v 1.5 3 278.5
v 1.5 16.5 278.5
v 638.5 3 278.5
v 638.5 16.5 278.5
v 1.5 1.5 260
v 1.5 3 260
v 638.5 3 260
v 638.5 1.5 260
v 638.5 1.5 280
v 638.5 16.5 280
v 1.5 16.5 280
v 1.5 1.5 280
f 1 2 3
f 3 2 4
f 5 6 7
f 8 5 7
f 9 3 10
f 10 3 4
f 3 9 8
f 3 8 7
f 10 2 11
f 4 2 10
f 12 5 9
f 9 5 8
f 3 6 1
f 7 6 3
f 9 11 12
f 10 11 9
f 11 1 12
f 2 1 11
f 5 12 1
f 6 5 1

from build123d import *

# Parameters (mm, degrees)
BOX013_W      = 637
BOX013_H      = 15
BOX013_DEPTH  = 20
BOX012_W      = 637
BOX012_H      = 15
BOX012_DEPTH  = 20
SKETCH012_R   = 2.05
HOLE007_DEPTH = 1291.481784


with BuildPart() as cube008:
    # Box013 → Box013 (new body)
    with BuildSketch(Plane(origin=(1.5, 1.5, -1.5), x_dir=(1, 0, 0), z_dir=(0, 0, 1))):
        with Locations((318.5, 7.5)):
            Rectangle(BOX013_W, BOX013_H)
    extrude(amount=BOX013_DEPTH)


with BuildPart() as top_front_body:
    # Box012 → Box012 (new body)
    with BuildSketch(Plane(origin=(1.5, 0, 0), x_dir=(1, 0, 0), z_dir=(0, 0, 1))):
        with Locations((318.5, 7.5)):
            Rectangle(BOX012_W, BOX012_H)
    extrude(amount=BOX012_DEPTH)

    # Cut: cut Cube008
    add(cube008.part, mode=Mode.SUBTRACT)


with BuildPart() as top_front_body_1:
    # Cut placement: moved
    add(top_front_body.part.moved(Location((0, 1.5, 250))))


with BuildPart() as top_front_body_2:
    # BaseFeature005 placement: moved
    add(top_front_body_1.part.moved(Location((0, -1.5, -250))))

    # Sketch012 → Hole007 (cut, through all)
    with BuildSketch(Plane.XZ.offset(1.5)):
        with Locations((-7.75, 9.25)):
            Circle(SKETCH012_R)
    hole007 = extrude(amount=-HOLE007_DEPTH, mode=Mode.SUBTRACT)

    # Mirrored004: Hole007 across Sketch012 Axis0
    add(hole007.mirror(Plane(origin=(320, -1.5, 19.25), x_dir=(0, -1, 0), z_dir=(1, 0, 0))), mode=Mode.SUBTRACT)


with BuildPart() as top_front_body_3:
    # Body005 placement: moved
    add(top_front_body_2.part.moved(Location((0, 1.5, 260))))


solid = top_front_body_3.part
